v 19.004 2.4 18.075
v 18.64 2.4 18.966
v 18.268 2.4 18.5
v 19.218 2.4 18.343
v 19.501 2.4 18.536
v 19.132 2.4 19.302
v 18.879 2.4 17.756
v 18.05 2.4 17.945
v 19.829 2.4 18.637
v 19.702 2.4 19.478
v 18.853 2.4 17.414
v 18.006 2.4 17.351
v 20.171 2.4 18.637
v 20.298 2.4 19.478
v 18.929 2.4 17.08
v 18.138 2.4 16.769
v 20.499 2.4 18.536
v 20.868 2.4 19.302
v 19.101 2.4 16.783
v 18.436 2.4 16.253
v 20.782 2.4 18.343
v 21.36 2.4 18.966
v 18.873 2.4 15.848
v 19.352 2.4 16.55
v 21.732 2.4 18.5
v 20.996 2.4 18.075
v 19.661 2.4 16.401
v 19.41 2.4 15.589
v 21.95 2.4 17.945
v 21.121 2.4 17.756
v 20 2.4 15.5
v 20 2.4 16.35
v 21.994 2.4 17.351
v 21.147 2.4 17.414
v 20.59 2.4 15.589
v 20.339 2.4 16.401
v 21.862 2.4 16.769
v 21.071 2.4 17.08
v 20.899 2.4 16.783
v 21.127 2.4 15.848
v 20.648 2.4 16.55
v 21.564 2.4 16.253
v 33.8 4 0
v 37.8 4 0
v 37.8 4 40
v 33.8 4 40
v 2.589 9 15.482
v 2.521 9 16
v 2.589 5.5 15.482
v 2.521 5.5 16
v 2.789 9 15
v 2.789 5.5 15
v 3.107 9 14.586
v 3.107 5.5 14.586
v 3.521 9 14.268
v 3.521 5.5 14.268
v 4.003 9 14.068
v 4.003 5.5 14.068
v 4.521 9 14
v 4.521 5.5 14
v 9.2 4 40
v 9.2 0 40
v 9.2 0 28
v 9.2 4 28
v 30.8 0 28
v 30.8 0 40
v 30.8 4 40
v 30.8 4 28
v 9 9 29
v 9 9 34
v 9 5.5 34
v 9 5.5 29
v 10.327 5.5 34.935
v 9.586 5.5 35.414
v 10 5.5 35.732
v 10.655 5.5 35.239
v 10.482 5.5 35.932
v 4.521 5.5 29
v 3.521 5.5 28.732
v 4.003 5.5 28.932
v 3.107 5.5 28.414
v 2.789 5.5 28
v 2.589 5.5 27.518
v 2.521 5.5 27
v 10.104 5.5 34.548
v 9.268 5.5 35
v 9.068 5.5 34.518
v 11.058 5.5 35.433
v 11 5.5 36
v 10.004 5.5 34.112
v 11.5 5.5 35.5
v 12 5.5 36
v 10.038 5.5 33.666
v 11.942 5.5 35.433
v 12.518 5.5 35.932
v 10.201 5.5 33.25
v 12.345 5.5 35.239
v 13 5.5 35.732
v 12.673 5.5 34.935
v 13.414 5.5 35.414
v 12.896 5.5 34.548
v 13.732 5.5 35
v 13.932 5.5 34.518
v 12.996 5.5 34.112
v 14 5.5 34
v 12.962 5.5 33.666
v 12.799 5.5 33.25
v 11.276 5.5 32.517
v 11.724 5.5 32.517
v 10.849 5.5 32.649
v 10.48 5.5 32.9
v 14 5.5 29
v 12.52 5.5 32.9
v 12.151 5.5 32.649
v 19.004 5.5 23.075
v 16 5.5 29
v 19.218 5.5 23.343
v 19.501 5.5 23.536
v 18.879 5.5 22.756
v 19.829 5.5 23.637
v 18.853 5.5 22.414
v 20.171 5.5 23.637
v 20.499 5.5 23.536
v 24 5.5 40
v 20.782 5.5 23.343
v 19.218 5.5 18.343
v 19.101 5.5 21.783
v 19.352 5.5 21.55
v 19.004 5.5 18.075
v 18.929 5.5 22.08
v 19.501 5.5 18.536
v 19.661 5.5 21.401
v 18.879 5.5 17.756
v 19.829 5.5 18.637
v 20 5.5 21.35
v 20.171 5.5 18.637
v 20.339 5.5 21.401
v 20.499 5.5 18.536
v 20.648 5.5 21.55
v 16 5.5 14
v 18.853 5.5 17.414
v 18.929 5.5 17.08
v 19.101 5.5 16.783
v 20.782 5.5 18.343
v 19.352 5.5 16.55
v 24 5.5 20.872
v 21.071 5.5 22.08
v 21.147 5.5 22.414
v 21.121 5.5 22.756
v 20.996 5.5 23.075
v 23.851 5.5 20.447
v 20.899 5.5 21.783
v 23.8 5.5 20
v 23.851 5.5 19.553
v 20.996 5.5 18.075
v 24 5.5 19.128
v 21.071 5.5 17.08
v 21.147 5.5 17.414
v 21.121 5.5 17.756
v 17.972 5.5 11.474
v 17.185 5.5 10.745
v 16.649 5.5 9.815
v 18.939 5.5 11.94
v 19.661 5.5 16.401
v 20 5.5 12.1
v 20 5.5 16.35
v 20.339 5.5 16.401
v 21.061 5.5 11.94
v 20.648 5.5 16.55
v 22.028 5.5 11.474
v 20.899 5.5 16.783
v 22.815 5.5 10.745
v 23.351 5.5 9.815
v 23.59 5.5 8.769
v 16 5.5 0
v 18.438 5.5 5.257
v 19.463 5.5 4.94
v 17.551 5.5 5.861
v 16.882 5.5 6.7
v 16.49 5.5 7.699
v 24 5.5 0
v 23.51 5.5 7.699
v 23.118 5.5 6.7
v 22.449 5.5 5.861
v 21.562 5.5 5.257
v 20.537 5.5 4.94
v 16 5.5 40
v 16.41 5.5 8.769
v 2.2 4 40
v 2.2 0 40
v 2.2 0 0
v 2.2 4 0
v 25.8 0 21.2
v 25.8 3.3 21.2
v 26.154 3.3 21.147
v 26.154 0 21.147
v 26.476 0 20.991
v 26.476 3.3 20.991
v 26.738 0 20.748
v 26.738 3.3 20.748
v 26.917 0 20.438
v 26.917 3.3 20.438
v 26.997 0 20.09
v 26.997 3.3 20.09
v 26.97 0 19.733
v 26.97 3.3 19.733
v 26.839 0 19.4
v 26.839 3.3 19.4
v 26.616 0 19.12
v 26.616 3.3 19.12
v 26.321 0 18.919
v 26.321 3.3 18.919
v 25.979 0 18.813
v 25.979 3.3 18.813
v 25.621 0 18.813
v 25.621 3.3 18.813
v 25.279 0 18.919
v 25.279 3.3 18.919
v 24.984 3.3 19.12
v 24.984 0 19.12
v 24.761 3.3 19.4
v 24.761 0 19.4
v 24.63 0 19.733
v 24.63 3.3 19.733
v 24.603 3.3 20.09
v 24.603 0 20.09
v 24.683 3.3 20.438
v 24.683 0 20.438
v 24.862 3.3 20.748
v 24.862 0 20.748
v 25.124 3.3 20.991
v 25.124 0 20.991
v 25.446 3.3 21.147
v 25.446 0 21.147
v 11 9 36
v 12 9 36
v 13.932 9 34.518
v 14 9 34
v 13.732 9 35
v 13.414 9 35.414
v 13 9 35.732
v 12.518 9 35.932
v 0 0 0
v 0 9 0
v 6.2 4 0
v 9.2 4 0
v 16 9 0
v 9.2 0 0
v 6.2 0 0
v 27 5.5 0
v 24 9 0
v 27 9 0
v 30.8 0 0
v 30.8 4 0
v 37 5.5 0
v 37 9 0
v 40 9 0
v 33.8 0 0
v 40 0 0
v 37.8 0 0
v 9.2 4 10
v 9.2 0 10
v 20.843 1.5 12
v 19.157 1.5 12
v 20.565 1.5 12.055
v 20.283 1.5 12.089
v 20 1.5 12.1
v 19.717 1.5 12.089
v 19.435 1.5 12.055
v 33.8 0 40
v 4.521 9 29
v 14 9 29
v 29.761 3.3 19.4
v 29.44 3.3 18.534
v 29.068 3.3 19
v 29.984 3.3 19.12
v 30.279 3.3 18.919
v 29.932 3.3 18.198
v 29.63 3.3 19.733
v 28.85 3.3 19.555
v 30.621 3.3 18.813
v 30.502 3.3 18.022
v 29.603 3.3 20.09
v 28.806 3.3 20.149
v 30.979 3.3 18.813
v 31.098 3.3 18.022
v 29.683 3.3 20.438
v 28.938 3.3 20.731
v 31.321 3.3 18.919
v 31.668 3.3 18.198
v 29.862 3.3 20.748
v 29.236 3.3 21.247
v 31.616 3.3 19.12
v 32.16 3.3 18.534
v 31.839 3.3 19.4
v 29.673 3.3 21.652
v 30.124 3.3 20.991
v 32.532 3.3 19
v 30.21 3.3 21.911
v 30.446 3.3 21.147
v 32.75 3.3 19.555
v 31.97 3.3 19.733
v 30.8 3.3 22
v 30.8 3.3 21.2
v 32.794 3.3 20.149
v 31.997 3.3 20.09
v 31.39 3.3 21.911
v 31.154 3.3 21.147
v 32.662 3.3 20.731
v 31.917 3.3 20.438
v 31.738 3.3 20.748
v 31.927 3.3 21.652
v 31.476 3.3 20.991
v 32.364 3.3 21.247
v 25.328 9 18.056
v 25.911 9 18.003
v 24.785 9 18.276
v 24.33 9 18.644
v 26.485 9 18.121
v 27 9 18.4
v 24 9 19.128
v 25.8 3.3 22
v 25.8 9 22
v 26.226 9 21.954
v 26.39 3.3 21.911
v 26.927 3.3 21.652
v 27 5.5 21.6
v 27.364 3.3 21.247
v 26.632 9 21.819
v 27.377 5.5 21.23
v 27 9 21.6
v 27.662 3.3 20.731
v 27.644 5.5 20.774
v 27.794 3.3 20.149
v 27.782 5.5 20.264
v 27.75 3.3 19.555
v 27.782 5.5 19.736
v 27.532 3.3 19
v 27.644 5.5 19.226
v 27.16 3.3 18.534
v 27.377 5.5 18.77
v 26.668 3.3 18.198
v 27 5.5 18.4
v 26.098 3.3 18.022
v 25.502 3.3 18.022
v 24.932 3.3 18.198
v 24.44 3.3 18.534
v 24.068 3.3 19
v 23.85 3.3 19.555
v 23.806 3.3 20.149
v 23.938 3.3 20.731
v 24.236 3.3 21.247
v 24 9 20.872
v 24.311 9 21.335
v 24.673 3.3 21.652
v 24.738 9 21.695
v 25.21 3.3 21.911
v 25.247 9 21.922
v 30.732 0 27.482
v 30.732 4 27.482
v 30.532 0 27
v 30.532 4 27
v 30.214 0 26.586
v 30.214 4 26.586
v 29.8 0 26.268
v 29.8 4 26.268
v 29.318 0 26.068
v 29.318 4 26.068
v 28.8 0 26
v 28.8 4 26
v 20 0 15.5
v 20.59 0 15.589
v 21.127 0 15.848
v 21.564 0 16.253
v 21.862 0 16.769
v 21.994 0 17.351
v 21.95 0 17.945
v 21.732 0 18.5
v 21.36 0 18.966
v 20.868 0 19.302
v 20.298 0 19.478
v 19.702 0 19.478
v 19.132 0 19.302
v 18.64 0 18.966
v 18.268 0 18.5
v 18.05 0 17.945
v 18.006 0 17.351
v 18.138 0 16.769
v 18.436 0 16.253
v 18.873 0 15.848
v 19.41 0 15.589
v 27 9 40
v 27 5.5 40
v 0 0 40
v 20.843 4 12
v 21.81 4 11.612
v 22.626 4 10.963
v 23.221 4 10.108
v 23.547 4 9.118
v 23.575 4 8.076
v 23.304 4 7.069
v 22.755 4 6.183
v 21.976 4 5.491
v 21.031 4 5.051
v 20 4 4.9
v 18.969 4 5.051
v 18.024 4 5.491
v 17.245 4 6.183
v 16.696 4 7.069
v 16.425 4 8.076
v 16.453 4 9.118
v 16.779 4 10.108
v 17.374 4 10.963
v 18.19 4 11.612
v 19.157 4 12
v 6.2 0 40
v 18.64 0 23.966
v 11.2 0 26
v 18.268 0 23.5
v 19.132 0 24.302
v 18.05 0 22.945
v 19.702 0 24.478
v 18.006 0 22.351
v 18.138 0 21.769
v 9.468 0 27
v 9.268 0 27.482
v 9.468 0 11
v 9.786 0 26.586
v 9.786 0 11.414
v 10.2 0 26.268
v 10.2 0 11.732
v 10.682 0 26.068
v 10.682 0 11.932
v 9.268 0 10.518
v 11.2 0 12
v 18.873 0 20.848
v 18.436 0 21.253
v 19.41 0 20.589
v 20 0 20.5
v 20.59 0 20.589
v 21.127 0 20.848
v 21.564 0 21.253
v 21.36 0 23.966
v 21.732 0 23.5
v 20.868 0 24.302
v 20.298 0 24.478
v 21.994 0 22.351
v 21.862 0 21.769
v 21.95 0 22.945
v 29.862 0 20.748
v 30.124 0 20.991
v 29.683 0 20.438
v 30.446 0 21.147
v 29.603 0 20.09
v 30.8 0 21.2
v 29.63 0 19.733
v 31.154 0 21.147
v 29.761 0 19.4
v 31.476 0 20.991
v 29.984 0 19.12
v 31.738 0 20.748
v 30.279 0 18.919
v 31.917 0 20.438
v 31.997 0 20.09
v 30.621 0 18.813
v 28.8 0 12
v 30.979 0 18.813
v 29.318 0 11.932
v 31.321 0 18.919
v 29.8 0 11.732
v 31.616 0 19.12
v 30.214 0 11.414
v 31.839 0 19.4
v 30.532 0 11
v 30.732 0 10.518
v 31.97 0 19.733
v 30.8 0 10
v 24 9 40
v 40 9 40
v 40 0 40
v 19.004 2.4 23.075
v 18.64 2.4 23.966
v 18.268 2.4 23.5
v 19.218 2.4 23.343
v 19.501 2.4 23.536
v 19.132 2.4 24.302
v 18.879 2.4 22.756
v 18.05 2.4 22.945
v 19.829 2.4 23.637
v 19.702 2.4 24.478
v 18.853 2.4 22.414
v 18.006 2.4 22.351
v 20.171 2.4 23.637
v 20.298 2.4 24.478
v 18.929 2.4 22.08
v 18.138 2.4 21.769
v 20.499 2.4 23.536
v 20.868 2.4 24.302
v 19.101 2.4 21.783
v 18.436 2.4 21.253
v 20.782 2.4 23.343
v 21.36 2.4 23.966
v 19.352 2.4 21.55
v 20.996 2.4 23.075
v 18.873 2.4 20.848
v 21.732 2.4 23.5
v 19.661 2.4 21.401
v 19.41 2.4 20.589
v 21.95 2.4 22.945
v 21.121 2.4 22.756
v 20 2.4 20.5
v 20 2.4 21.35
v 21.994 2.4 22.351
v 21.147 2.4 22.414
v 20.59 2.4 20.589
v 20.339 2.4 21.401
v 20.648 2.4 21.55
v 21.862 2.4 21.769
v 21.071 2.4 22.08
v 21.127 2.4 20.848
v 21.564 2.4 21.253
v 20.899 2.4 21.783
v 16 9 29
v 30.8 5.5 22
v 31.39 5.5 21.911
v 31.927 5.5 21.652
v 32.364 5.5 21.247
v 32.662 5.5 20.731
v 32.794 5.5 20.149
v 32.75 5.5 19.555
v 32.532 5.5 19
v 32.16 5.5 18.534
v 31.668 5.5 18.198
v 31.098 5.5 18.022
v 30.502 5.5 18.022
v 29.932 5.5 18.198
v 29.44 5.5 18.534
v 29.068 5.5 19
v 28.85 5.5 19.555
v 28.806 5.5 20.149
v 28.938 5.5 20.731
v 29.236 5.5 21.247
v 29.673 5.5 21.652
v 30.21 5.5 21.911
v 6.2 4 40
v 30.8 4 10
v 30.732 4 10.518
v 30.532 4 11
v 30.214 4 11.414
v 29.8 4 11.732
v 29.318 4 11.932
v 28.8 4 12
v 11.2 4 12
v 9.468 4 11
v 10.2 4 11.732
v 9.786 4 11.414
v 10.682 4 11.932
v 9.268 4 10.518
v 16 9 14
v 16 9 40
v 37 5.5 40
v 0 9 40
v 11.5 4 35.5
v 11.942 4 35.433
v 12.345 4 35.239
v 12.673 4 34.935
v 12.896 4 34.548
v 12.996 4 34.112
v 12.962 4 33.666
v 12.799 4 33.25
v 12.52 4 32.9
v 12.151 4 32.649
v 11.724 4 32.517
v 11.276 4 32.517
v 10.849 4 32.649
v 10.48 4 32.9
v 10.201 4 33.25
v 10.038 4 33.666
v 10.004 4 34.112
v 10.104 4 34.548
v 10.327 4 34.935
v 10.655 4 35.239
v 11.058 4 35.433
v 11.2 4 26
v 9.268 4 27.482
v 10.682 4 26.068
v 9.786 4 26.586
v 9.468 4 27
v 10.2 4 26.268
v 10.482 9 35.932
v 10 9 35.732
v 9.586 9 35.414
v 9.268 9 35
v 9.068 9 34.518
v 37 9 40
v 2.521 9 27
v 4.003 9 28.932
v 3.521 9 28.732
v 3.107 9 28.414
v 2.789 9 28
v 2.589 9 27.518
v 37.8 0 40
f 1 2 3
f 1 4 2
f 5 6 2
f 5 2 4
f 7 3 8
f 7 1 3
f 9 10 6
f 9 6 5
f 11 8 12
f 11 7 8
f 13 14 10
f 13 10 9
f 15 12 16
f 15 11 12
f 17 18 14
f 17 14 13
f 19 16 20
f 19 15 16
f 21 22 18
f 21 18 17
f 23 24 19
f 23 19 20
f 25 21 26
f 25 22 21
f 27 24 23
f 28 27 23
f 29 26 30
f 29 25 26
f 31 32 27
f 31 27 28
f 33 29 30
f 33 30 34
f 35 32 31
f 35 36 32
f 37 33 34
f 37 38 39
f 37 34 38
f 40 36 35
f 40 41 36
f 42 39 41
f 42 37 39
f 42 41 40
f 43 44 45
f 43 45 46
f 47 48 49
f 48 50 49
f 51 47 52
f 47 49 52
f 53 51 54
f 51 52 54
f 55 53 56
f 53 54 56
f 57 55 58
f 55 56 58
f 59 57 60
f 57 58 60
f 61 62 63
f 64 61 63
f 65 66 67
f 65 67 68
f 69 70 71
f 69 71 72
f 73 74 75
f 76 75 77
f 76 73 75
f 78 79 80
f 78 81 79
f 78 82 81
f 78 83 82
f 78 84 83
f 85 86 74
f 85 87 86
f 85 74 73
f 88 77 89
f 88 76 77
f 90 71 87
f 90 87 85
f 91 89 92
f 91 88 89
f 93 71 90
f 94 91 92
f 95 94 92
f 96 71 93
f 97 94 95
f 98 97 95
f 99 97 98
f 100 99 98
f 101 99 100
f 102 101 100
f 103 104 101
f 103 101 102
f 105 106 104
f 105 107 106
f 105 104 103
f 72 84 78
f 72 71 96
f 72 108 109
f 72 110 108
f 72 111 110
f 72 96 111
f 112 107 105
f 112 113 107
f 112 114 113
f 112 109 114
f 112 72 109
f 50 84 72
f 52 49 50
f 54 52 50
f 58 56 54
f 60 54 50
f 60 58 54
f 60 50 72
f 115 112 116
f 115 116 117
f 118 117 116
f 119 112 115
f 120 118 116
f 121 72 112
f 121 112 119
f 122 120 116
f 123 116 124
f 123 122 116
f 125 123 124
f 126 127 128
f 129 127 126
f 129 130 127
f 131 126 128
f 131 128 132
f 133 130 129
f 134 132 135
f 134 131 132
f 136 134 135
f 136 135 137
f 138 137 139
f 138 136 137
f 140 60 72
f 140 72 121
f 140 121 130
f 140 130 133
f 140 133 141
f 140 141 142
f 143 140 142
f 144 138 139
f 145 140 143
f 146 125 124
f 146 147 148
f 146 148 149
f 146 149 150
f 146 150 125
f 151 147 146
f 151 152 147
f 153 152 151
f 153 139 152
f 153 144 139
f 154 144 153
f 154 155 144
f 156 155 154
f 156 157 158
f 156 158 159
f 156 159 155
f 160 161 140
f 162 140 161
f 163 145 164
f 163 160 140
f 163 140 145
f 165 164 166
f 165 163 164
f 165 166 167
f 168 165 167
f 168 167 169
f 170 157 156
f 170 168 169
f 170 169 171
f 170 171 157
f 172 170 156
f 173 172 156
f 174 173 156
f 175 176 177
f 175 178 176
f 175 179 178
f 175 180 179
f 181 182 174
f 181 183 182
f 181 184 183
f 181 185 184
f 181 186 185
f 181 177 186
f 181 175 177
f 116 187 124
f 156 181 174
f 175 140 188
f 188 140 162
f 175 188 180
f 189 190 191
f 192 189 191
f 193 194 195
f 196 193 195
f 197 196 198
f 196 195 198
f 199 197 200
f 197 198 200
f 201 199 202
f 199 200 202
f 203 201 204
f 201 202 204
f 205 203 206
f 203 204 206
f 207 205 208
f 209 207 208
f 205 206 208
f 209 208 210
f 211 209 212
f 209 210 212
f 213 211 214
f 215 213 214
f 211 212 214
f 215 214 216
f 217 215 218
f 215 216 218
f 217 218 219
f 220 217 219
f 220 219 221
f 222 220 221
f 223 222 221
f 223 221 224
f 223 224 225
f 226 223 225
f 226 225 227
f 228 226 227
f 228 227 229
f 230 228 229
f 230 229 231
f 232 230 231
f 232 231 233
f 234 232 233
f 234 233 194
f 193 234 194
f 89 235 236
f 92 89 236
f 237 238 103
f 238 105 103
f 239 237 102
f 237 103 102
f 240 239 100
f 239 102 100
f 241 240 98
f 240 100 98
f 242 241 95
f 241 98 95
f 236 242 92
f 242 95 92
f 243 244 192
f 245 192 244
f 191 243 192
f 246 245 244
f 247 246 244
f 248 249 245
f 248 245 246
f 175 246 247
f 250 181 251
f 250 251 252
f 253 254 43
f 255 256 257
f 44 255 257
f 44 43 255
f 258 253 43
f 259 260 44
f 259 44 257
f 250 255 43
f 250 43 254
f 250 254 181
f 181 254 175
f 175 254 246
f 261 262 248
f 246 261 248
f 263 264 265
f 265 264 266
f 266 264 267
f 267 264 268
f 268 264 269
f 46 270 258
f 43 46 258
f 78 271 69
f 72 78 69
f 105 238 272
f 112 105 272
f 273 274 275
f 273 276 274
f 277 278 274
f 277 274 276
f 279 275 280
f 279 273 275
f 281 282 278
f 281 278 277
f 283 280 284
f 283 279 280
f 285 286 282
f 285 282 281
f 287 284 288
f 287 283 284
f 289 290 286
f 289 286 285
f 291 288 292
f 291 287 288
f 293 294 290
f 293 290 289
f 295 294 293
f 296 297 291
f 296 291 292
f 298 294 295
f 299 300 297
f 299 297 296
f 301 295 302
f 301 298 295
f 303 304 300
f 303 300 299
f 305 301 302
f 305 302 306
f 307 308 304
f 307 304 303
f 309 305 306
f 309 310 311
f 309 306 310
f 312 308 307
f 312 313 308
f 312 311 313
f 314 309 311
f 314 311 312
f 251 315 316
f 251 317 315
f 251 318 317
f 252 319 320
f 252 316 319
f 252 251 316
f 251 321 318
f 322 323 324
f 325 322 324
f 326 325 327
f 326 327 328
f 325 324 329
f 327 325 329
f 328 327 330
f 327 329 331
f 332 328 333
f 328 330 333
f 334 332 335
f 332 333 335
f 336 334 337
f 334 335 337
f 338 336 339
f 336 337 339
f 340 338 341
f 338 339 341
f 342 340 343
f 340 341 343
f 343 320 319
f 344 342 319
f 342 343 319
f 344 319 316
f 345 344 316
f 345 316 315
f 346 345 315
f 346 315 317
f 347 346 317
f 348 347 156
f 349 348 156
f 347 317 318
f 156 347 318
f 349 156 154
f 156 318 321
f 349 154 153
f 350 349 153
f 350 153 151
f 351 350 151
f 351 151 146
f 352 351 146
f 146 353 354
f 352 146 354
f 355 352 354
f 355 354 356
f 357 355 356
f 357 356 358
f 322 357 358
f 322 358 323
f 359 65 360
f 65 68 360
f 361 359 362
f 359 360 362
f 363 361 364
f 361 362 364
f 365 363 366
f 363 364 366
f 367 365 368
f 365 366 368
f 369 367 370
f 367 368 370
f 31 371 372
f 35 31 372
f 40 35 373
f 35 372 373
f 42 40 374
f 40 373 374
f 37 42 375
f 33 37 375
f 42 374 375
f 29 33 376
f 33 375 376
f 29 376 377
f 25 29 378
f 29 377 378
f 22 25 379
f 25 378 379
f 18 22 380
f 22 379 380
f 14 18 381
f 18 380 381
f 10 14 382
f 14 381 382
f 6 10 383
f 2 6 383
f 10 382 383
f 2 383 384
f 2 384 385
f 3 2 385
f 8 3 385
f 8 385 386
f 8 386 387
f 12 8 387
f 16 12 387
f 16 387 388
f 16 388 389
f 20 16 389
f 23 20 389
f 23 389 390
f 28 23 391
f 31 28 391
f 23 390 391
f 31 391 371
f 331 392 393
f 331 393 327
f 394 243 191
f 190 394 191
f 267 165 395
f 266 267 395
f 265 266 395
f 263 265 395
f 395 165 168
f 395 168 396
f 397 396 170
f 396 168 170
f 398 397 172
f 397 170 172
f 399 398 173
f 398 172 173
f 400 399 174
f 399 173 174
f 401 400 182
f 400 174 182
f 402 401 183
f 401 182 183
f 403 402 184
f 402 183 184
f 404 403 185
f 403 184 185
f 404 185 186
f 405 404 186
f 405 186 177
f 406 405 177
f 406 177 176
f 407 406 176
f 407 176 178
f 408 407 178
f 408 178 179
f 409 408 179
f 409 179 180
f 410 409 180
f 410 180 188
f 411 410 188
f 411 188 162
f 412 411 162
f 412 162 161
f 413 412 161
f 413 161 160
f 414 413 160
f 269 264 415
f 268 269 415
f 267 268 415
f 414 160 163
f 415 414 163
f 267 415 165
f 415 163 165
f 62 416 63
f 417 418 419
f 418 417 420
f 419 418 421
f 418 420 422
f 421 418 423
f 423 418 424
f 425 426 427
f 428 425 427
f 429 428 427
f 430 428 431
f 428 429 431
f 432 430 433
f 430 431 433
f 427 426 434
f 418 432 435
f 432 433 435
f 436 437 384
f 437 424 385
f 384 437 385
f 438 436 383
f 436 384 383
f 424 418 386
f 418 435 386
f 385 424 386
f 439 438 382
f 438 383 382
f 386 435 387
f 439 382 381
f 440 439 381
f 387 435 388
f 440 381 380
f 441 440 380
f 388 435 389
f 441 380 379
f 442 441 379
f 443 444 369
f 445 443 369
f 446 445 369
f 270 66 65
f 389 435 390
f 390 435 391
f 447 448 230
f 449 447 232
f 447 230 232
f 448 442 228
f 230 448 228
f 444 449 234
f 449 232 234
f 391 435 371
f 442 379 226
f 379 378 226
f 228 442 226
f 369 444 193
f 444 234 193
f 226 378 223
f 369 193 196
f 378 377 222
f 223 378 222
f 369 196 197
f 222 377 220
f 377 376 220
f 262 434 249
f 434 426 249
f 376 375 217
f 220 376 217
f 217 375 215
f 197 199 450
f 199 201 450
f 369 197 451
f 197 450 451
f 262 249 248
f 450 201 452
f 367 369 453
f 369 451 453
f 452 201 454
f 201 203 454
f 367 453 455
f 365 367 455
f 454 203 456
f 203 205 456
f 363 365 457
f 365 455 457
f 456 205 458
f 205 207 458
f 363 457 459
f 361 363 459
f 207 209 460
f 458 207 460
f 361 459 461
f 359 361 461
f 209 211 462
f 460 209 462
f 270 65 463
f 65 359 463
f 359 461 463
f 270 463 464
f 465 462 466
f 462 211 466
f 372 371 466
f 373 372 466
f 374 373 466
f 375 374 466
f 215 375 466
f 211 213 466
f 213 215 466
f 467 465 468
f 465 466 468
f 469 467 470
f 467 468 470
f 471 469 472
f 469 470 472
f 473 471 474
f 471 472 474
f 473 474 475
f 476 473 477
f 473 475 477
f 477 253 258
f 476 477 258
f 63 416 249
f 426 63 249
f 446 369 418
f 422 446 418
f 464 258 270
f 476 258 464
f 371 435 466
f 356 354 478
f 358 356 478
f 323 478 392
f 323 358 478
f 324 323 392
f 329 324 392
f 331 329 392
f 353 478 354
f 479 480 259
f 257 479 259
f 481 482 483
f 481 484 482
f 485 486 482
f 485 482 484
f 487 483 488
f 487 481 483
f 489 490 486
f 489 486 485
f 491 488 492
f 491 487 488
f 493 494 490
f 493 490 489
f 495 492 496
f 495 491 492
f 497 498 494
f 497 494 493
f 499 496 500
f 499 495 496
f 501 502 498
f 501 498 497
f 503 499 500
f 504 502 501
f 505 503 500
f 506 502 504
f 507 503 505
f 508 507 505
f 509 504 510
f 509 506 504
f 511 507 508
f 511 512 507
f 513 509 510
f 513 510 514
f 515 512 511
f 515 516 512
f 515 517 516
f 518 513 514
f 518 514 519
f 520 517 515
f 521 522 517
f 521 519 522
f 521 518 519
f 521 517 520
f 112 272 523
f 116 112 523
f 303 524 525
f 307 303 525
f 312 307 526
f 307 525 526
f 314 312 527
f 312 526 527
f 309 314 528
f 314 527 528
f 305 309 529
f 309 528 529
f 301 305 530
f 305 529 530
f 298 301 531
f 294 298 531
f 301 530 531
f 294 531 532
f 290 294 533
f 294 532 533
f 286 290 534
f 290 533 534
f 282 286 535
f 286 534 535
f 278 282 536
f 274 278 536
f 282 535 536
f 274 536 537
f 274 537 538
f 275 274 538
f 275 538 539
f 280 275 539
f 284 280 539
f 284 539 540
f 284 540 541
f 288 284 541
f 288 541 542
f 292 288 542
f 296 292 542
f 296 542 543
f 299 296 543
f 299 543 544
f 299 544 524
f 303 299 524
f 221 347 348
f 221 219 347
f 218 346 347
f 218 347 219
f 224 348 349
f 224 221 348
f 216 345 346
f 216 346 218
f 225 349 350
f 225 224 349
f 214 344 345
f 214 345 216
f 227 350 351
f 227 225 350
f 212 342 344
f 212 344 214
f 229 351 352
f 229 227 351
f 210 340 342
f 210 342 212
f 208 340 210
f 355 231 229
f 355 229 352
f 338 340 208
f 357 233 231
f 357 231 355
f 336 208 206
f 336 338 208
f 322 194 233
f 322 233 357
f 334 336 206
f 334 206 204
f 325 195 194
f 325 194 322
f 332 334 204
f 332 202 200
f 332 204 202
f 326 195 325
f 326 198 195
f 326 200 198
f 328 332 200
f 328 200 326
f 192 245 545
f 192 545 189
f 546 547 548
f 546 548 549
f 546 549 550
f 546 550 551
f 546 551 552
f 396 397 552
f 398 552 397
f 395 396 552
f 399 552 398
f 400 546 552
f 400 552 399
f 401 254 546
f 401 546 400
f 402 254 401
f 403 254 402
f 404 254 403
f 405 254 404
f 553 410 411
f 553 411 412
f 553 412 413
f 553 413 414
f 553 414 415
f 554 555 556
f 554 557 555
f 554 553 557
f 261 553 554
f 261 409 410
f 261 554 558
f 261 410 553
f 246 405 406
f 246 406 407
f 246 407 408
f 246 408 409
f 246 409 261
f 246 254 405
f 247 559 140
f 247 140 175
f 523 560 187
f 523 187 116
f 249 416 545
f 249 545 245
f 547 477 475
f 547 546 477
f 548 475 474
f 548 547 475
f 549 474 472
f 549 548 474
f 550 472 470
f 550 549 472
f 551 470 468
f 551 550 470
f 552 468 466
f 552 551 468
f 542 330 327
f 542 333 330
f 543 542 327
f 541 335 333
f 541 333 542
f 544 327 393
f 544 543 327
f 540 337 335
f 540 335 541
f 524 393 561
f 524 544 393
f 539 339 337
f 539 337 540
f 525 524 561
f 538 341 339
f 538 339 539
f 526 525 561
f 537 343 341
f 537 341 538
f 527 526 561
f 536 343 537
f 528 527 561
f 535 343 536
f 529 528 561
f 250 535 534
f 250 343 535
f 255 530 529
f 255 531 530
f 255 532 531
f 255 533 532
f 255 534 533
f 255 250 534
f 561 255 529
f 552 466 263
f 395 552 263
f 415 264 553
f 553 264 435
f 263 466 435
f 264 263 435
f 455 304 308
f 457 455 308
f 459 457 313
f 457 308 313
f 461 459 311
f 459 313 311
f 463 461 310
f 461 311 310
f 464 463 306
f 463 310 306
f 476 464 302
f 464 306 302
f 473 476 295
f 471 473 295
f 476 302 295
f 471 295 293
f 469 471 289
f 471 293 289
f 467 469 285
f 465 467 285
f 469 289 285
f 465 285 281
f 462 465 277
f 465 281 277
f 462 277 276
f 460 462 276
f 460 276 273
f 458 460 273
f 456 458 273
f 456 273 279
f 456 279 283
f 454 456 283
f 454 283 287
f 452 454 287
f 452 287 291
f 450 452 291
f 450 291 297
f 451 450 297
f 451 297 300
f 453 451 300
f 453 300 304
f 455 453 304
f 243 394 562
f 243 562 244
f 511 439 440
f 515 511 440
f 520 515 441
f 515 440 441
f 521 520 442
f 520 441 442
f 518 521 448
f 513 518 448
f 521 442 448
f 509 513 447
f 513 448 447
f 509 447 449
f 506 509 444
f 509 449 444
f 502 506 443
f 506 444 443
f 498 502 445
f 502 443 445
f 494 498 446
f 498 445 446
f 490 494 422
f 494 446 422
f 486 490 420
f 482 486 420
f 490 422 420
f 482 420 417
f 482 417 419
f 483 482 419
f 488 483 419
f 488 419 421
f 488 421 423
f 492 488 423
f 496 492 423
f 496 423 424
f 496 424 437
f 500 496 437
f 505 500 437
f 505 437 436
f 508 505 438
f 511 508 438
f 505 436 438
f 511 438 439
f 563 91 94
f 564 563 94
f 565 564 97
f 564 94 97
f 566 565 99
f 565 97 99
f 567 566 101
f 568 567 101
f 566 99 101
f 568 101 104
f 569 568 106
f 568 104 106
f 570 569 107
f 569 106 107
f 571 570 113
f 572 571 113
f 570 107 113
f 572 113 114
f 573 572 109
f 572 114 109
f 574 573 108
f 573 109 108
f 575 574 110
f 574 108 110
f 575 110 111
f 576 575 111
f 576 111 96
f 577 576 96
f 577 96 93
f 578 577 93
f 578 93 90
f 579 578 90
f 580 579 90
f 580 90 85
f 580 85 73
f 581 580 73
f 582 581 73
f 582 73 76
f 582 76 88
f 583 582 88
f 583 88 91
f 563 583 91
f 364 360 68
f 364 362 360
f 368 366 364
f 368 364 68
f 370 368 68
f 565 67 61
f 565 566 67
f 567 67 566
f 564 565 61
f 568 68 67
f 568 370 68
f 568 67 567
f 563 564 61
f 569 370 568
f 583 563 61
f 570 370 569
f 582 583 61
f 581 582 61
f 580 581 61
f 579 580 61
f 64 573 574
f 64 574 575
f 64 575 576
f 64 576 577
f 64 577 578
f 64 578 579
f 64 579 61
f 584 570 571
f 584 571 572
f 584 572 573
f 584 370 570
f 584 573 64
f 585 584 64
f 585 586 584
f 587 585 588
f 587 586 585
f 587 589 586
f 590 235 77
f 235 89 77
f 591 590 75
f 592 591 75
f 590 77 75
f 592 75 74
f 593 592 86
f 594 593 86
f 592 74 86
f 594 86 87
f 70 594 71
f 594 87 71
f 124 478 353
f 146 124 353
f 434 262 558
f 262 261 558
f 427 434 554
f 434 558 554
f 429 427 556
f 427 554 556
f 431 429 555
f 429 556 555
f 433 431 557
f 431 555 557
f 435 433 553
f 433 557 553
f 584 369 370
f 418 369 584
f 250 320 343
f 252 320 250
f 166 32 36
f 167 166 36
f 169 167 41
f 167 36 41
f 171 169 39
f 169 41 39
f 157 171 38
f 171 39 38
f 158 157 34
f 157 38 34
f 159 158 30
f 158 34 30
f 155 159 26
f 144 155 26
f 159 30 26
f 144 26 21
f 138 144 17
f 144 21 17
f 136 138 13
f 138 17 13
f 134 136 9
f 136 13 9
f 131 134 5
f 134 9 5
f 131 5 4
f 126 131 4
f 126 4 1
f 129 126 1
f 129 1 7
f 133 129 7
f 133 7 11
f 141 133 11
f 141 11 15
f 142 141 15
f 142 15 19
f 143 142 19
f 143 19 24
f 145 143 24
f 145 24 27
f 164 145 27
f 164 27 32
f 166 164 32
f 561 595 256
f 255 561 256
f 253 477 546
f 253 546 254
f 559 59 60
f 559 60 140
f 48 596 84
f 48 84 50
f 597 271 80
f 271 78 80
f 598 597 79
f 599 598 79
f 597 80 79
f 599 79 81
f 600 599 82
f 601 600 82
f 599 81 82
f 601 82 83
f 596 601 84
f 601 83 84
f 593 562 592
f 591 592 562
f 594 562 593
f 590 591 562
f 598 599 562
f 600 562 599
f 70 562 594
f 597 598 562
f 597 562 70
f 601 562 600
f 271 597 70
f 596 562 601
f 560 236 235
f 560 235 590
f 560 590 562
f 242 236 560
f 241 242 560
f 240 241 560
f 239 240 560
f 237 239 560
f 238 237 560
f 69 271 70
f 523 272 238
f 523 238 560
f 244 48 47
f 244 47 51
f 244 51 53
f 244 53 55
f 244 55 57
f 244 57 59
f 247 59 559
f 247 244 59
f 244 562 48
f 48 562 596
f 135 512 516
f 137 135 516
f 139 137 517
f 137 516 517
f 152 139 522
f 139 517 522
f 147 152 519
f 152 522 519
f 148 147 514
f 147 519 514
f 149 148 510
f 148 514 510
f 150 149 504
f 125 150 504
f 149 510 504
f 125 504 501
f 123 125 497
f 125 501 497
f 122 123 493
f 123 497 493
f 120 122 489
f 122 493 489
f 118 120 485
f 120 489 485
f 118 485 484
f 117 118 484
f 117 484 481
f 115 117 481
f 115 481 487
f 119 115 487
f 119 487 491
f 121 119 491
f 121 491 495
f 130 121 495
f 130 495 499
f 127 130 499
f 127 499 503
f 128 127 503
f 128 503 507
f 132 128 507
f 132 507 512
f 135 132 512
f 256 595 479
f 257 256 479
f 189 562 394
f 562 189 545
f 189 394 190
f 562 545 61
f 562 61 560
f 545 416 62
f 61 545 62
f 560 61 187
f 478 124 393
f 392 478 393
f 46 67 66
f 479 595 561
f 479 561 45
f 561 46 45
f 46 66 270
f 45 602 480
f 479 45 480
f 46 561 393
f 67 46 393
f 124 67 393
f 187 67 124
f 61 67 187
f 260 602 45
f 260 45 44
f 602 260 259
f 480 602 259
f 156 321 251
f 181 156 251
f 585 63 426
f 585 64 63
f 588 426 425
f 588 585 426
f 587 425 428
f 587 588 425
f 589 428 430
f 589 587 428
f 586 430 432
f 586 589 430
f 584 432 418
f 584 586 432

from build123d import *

# Parameters (mm, degrees)
SKETCH_1_W           = 40
SKETCH_1_H           = 40
EXTRUDE_1_DEPTH      = 9
SKETCH_2_W           = 8
SKETCH_2_H           = 40
CUT_EXTRUDE_1_DEPTH  = 3.5
SKETCH_3_R           = 1.15
CUT_EXTRUDE_2_DEPTH  = 58.280013966
SKETCH_4_R           = 2
CUT_EXTRUDE_3_DEPTH  = 2.4
SKETCH_5_R           = 1.2
CUT_EXTRUDE_4_DEPTH  = 58.280013966
SKETCH_6_R           = 2
CUT_EXTRUDE_5_DEPTH  = 5.7
SKETCH_7_W           = 13.47912662
SKETCH_7_H           = 15
CUT_EXTRUDE_6_DEPTH  = 3.5
SKETCH_12_W          = 4
SKETCH_12_H          = 40
SKETCH_12_W_2        = 21.6
SKETCH_12_H_2        = 12
SKETCH_12_H_3        = 14
CUT_EXTRUDE_11_DEPTH = 4
FILLET_3_R           = 2
SKETCH_15_R          = 3.6
CUT_EXTRUDE_13_DEPTH = 4
SKETCH_16_W          = 5
SKETCH_16_H          = 7
CUT_EXTRUDE_14_DEPTH = 3.5
SKETCH_17_R          = 1.5
CUT_EXTRUDE_15_DEPTH = 3.5
FILLET_5_R           = 2
SKETCH_18_W          = 10
SKETCH_18_H          = 40
CUT_EXTRUDE_16_DEPTH = 3.5


with BuildPart() as part:
    # 草图1 → 凸台-拉伸1 (new body)
    with BuildSketch(Plane(origin=(0, 0, 0), x_dir=(1, 0, 0), z_dir=(0, 1, 0))):
        with Locations((20, -20)):
            Rectangle(SKETCH_1_W, SKETCH_1_H)
    extrude(amount=EXTRUDE_1_DEPTH)

    # 草图2 → 切除-拉伸1 (cut)
    with BuildSketch(Plane(origin=(0, 9, 0), x_dir=(1, 0, 0), z_dir=(0, 1, 0))):
        with Locations((20, -20)):
            Rectangle(SKETCH_2_W, SKETCH_2_H)
    extrude(amount=-CUT_EXTRUDE_1_DEPTH, mode=Mode.SUBTRACT)

    # 草图3 → 切除-拉伸2 (cut, through all)
    with BuildSketch(Plane(origin=(0, 0, 0), x_dir=(-1, 0, 0), z_dir=(0, -1, 0))):
        with Locations(Location((-20, -22.5, 0), (0, 0, 90))):
            Circle(SKETCH_3_R)
        with Locations(Location((-20, -17.5, 0), (0, 0, 90))):
            Circle(SKETCH_3_R)
    extrude(amount=-CUT_EXTRUDE_2_DEPTH, mode=Mode.SUBTRACT)

    # 草图4 → 切除-拉伸3 (cut)
    with BuildSketch(Plane(origin=(0, 0, 0), x_dir=(-1, 0, 0), z_dir=(0, -1, 0))):
        with Locations(Location((-20, -22.5, 0), (0, 0, 90))):
            Circle(SKETCH_4_R)
        with Locations(Location((-20, -17.5, 0), (0, 0, 90))):
            Circle(SKETCH_4_R)
    extrude(amount=-CUT_EXTRUDE_3_DEPTH, mode=Mode.SUBTRACT)

    # 草图5 → 切除-拉伸4 (cut, through all)
    with BuildSketch(Plane(origin=(0, 9, 0), x_dir=(1, 0, 0), z_dir=(0, 1, 0))):
        with Locations(Location((25.8, -20, 0), (0, 0, 270))):
            Circle(SKETCH_5_R)
        with Locations(Location((30.8, -20, 0), (0, 0, 270))):
            Circle(SKETCH_5_R)
    extrude(amount=-CUT_EXTRUDE_4_DEPTH, mode=Mode.SUBTRACT)

    # 草图6 → 切除-拉伸5 (cut)
    with BuildSketch(Plane(origin=(0, 9, 0), x_dir=(1, 0, 0), z_dir=(0, 1, 0))):
        with Locations(Location((30.8, -20, 0), (0, 0, 270))):
            Circle(SKETCH_6_R)
        with Locations(Location((25.8, -20, 0), (0, 0, 270))):
            Circle(SKETCH_6_R)
    extrude(amount=-CUT_EXTRUDE_5_DEPTH, mode=Mode.SUBTRACT)

    # 草图7 → 切除-拉伸6 (cut)
    with BuildSketch(Plane(origin=(0, 9, 0), x_dir=(1, 0, 0), z_dir=(0, 1, 0))):
        with Locations((9.26043669, -21.5)):
            Rectangle(SKETCH_7_W, SKETCH_7_H)
    extrude(amount=-CUT_EXTRUDE_6_DEPTH, mode=Mode.SUBTRACT)

    # 草图12 → 切除-拉伸11 (cut)
    with BuildSketch(Plane(origin=(0, 0, 0), x_dir=(-1, 0, 0), z_dir=(0, -1, 0))):
        with Locations((-4.2, -20)):
            Rectangle(SKETCH_12_W, SKETCH_12_H)
        with Locations((-35.8, -20)):
            Rectangle(SKETCH_12_W, SKETCH_12_H)
        with Locations((-20, -6)):
            Rectangle(SKETCH_12_W_2, SKETCH_12_H_2)
        with Locations((-20, -33)):
            Rectangle(SKETCH_12_W_2, SKETCH_12_H_3)
    extrude(amount=-CUT_EXTRUDE_11_DEPTH, mode=Mode.SUBTRACT)

    # 圆角3
    fillet_3_edges = [part.edges().sort_by_distance(p)[0] for p in [
        (30.8, 2, 12),
        (9.2, 2, 12),
        (9.2, 2, 26),
        (30.8, 2, 26),
    ]]
    fillet(fillet_3_edges, radius=FILLET_3_R)

    # 草图15 → 切除-拉伸13 (cut)
    with BuildSketch(Plane(origin=(0, 5.5, 0), x_dir=(1, 0, 0), z_dir=(0, 1, 0))):
        with Locations(Location((20, -8.5, 0), (0, 0, 270))):
            Circle(SKETCH_15_R)
    extrude(amount=-CUT_EXTRUDE_13_DEPTH, mode=Mode.SUBTRACT)

    # 草图16 → 切除-拉伸14 (cut)
    with BuildSketch(Plane(origin=(0, 9, 0), x_dir=(1, 0, 0), z_dir=(0, 1, 0))):
        with Locations((11.5, -32.5)):
            Rectangle(SKETCH_16_W, SKETCH_16_H)
    extrude(amount=-CUT_EXTRUDE_14_DEPTH, mode=Mode.SUBTRACT)

    # 草图17 → 切除-拉伸15 (cut)
    with BuildSketch(Plane(origin=(0, 5.5, 0), x_dir=(1, 0, 0), z_dir=(0, 1, 0))):
        with Locations(Location((11.5, -34, 0), (0, 0, 270))):
            Circle(SKETCH_17_R)
    extrude(amount=-CUT_EXTRUDE_15_DEPTH, mode=Mode.SUBTRACT)

    # 圆角5
    fillet_5_edges = [part.edges().sort_by_distance(p)[0] for p in [
        (9, 7.25, 36),
        (14, 7.25, 36),
        (2.52087338, 7.25, 29),
        (2.52087338, 7.25, 14),
    ]]
    fillet(fillet_5_edges, radius=FILLET_5_R)

    # 草图18 → 切除-拉伸16 (cut)
    with BuildSketch(Plane(origin=(0, 9, 0), x_dir=(1, 0, 0), z_dir=(0, 1, 0))):
        with Locations((32, -20)):
            Rectangle(SKETCH_18_W, SKETCH_18_H)
    extrude(amount=-CUT_EXTRUDE_16_DEPTH, mode=Mode.SUBTRACT)


solid = part.part
